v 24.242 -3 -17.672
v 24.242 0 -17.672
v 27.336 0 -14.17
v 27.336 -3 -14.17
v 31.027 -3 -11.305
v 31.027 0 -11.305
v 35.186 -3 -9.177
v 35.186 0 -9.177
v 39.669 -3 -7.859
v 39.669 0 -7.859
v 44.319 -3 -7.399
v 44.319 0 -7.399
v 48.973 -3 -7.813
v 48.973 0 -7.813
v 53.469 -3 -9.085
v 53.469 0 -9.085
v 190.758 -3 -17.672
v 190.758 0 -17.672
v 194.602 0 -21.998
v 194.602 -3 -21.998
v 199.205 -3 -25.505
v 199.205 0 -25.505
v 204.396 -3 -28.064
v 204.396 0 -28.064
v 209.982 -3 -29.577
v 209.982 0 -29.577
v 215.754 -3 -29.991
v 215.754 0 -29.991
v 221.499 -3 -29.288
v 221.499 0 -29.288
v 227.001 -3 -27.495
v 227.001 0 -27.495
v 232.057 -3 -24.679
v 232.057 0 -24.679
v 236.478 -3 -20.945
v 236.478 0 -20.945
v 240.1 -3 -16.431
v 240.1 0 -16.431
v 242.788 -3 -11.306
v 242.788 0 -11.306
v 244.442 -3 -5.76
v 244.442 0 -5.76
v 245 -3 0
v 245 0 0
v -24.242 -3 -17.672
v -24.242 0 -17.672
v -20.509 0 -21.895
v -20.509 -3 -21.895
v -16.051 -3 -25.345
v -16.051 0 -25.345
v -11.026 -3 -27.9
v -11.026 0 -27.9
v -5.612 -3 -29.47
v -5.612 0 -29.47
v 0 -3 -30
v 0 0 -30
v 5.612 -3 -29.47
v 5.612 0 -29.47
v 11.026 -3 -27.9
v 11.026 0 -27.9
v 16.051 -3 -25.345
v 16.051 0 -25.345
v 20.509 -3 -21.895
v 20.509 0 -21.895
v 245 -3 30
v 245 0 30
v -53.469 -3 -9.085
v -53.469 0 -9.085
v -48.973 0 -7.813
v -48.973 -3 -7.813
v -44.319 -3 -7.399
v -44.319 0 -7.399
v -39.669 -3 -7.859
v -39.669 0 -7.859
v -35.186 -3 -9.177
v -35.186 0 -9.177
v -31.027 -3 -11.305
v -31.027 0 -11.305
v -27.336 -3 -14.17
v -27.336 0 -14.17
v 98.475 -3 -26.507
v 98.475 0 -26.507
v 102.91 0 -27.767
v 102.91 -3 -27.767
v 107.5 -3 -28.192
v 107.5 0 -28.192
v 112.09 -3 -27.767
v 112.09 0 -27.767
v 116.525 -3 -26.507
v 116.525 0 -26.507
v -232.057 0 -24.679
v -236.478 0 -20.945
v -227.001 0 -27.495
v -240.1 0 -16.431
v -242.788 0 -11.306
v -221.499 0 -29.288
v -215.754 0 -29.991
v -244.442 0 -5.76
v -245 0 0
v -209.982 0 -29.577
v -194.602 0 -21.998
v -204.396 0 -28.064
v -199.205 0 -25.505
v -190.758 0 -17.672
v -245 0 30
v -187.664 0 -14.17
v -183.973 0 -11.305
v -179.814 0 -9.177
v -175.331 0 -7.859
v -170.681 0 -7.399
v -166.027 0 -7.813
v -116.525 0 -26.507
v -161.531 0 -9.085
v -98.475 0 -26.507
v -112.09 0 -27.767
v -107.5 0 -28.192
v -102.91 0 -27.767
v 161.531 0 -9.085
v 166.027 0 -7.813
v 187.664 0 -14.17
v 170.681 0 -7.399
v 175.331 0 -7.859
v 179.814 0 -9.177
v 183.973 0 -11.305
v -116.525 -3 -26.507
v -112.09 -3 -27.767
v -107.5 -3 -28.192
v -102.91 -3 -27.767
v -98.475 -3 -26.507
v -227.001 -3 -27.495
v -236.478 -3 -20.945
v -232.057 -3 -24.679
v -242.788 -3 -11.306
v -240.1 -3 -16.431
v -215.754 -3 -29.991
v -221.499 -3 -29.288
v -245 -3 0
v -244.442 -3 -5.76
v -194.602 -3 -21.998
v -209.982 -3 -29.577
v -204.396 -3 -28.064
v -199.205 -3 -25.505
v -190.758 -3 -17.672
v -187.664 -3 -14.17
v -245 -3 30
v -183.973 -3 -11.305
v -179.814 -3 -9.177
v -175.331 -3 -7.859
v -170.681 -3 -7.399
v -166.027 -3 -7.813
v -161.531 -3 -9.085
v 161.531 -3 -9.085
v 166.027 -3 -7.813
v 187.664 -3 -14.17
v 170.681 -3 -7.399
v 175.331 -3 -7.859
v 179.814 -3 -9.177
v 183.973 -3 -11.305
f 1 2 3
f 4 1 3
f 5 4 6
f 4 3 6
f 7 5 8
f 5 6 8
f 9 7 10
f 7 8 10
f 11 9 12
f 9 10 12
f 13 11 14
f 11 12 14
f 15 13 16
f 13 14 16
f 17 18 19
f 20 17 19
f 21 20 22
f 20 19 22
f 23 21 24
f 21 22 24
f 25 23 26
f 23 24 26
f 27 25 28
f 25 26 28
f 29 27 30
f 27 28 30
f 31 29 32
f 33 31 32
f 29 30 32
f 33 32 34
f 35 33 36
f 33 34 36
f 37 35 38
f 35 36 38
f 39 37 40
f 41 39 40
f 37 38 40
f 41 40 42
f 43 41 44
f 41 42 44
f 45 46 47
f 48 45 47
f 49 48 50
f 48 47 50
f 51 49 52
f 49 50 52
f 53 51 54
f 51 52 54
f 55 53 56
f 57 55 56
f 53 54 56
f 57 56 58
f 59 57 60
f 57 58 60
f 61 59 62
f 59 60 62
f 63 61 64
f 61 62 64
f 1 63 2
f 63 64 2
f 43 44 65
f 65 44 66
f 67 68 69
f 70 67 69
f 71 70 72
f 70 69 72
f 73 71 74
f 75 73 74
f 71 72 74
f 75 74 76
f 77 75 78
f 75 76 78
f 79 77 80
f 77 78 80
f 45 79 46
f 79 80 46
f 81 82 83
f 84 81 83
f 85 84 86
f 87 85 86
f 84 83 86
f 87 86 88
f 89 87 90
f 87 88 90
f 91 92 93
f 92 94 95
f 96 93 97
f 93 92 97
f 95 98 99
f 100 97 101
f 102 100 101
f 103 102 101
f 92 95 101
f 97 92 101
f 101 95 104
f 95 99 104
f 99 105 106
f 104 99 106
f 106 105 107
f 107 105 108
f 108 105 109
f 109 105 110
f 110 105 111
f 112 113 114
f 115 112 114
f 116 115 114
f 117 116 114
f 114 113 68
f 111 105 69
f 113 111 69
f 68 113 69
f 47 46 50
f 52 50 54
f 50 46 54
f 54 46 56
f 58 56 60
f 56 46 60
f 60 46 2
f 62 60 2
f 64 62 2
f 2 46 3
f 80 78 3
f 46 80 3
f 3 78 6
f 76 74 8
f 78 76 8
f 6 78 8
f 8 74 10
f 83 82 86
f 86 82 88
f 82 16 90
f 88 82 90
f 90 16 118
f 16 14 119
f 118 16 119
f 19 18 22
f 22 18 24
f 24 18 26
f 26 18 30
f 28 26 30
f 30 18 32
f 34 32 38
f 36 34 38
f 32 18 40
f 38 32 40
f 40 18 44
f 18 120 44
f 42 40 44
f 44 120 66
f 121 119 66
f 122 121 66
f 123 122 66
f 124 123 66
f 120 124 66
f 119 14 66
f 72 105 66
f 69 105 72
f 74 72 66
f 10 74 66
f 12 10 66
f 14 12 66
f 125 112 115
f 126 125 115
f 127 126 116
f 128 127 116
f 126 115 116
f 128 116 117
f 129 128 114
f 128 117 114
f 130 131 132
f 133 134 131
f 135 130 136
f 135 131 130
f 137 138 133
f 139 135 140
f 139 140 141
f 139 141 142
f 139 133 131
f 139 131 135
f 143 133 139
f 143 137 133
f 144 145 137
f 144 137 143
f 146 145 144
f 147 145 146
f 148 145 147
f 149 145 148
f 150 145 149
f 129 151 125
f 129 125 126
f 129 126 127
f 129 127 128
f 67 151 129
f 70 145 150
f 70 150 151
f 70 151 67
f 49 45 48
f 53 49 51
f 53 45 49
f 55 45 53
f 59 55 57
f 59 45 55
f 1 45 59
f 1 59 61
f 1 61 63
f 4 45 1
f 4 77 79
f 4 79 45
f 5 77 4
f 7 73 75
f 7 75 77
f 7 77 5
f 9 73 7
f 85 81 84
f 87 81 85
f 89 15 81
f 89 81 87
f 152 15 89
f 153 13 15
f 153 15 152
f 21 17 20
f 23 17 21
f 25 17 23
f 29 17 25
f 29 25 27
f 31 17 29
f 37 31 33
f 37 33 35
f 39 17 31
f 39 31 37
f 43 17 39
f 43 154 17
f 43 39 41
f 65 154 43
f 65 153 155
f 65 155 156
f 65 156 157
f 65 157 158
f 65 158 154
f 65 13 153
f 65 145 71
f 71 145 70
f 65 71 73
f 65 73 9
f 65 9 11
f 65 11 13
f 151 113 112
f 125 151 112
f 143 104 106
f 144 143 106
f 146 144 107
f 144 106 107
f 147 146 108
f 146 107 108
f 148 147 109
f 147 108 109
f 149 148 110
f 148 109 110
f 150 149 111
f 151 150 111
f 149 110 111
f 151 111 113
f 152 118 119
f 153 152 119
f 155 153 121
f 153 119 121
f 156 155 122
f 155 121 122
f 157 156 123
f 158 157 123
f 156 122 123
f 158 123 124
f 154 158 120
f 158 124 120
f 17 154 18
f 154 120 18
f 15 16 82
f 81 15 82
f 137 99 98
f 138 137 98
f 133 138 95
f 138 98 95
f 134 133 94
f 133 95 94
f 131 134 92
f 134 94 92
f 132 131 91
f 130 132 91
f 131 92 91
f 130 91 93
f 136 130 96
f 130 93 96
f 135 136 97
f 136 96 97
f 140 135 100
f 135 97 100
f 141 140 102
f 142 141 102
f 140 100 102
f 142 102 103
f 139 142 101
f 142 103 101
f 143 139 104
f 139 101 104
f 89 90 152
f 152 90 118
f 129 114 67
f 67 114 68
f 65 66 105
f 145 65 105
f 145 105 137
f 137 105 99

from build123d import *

# Parameters (mm, degrees)
F1_DEPTH = 3


with BuildPart() as f1:
    # F0 (on Front) → F1 (new body)
    with BuildSketch(Plane.XZ):
        with BuildLine():
            Line((245, 30), (-245, 30))
            Line((-245, 30), (-245, 0))
            ThreePointArc((-245, 0), (-224.293242, -28.524299), (-190.757623, -17.672214))
            ThreePointArc((-190.757623, -17.672214), (-177.603175, -8.412973), (-161.530789, -9.084856))
            Line((-161.530789, -9.084856), (-116.524853, -26.506509))
            ThreePointArc((-116.524853, -26.506509), (-107.5, -28.192306), (-98.475147, -26.506509))
            Line((-98.475147, -26.506509), (-53.469211, -9.084856))
            ThreePointArc((-53.469211, -9.084856), (-37.396825, -8.412973), (-24.242377, -17.672214))
            ThreePointArc((-24.242377, -17.672214), (0, -30), (24.242377, -17.672214))
            ThreePointArc((24.242377, -17.672214), (37.396825, -8.412973), (53.469211, -9.084856))
            Line((53.469211, -9.084856), (98.475147, -26.506509))
            ThreePointArc((98.475147, -26.506509), (107.5, -28.192306), (116.524853, -26.506509))
            Line((116.524853, -26.506509), (161.530789, -9.084856))
            ThreePointArc((161.530789, -9.084856), (177.603175, -8.412973), (190.757623, -17.672214))
            ThreePointArc((190.757623, -17.672214), (224.293242, -28.524299), (245, 0))
            Line((245, 0), (245, 30))
        make_face()
    extrude(amount=F1_DEPTH)


solid = f1.part
